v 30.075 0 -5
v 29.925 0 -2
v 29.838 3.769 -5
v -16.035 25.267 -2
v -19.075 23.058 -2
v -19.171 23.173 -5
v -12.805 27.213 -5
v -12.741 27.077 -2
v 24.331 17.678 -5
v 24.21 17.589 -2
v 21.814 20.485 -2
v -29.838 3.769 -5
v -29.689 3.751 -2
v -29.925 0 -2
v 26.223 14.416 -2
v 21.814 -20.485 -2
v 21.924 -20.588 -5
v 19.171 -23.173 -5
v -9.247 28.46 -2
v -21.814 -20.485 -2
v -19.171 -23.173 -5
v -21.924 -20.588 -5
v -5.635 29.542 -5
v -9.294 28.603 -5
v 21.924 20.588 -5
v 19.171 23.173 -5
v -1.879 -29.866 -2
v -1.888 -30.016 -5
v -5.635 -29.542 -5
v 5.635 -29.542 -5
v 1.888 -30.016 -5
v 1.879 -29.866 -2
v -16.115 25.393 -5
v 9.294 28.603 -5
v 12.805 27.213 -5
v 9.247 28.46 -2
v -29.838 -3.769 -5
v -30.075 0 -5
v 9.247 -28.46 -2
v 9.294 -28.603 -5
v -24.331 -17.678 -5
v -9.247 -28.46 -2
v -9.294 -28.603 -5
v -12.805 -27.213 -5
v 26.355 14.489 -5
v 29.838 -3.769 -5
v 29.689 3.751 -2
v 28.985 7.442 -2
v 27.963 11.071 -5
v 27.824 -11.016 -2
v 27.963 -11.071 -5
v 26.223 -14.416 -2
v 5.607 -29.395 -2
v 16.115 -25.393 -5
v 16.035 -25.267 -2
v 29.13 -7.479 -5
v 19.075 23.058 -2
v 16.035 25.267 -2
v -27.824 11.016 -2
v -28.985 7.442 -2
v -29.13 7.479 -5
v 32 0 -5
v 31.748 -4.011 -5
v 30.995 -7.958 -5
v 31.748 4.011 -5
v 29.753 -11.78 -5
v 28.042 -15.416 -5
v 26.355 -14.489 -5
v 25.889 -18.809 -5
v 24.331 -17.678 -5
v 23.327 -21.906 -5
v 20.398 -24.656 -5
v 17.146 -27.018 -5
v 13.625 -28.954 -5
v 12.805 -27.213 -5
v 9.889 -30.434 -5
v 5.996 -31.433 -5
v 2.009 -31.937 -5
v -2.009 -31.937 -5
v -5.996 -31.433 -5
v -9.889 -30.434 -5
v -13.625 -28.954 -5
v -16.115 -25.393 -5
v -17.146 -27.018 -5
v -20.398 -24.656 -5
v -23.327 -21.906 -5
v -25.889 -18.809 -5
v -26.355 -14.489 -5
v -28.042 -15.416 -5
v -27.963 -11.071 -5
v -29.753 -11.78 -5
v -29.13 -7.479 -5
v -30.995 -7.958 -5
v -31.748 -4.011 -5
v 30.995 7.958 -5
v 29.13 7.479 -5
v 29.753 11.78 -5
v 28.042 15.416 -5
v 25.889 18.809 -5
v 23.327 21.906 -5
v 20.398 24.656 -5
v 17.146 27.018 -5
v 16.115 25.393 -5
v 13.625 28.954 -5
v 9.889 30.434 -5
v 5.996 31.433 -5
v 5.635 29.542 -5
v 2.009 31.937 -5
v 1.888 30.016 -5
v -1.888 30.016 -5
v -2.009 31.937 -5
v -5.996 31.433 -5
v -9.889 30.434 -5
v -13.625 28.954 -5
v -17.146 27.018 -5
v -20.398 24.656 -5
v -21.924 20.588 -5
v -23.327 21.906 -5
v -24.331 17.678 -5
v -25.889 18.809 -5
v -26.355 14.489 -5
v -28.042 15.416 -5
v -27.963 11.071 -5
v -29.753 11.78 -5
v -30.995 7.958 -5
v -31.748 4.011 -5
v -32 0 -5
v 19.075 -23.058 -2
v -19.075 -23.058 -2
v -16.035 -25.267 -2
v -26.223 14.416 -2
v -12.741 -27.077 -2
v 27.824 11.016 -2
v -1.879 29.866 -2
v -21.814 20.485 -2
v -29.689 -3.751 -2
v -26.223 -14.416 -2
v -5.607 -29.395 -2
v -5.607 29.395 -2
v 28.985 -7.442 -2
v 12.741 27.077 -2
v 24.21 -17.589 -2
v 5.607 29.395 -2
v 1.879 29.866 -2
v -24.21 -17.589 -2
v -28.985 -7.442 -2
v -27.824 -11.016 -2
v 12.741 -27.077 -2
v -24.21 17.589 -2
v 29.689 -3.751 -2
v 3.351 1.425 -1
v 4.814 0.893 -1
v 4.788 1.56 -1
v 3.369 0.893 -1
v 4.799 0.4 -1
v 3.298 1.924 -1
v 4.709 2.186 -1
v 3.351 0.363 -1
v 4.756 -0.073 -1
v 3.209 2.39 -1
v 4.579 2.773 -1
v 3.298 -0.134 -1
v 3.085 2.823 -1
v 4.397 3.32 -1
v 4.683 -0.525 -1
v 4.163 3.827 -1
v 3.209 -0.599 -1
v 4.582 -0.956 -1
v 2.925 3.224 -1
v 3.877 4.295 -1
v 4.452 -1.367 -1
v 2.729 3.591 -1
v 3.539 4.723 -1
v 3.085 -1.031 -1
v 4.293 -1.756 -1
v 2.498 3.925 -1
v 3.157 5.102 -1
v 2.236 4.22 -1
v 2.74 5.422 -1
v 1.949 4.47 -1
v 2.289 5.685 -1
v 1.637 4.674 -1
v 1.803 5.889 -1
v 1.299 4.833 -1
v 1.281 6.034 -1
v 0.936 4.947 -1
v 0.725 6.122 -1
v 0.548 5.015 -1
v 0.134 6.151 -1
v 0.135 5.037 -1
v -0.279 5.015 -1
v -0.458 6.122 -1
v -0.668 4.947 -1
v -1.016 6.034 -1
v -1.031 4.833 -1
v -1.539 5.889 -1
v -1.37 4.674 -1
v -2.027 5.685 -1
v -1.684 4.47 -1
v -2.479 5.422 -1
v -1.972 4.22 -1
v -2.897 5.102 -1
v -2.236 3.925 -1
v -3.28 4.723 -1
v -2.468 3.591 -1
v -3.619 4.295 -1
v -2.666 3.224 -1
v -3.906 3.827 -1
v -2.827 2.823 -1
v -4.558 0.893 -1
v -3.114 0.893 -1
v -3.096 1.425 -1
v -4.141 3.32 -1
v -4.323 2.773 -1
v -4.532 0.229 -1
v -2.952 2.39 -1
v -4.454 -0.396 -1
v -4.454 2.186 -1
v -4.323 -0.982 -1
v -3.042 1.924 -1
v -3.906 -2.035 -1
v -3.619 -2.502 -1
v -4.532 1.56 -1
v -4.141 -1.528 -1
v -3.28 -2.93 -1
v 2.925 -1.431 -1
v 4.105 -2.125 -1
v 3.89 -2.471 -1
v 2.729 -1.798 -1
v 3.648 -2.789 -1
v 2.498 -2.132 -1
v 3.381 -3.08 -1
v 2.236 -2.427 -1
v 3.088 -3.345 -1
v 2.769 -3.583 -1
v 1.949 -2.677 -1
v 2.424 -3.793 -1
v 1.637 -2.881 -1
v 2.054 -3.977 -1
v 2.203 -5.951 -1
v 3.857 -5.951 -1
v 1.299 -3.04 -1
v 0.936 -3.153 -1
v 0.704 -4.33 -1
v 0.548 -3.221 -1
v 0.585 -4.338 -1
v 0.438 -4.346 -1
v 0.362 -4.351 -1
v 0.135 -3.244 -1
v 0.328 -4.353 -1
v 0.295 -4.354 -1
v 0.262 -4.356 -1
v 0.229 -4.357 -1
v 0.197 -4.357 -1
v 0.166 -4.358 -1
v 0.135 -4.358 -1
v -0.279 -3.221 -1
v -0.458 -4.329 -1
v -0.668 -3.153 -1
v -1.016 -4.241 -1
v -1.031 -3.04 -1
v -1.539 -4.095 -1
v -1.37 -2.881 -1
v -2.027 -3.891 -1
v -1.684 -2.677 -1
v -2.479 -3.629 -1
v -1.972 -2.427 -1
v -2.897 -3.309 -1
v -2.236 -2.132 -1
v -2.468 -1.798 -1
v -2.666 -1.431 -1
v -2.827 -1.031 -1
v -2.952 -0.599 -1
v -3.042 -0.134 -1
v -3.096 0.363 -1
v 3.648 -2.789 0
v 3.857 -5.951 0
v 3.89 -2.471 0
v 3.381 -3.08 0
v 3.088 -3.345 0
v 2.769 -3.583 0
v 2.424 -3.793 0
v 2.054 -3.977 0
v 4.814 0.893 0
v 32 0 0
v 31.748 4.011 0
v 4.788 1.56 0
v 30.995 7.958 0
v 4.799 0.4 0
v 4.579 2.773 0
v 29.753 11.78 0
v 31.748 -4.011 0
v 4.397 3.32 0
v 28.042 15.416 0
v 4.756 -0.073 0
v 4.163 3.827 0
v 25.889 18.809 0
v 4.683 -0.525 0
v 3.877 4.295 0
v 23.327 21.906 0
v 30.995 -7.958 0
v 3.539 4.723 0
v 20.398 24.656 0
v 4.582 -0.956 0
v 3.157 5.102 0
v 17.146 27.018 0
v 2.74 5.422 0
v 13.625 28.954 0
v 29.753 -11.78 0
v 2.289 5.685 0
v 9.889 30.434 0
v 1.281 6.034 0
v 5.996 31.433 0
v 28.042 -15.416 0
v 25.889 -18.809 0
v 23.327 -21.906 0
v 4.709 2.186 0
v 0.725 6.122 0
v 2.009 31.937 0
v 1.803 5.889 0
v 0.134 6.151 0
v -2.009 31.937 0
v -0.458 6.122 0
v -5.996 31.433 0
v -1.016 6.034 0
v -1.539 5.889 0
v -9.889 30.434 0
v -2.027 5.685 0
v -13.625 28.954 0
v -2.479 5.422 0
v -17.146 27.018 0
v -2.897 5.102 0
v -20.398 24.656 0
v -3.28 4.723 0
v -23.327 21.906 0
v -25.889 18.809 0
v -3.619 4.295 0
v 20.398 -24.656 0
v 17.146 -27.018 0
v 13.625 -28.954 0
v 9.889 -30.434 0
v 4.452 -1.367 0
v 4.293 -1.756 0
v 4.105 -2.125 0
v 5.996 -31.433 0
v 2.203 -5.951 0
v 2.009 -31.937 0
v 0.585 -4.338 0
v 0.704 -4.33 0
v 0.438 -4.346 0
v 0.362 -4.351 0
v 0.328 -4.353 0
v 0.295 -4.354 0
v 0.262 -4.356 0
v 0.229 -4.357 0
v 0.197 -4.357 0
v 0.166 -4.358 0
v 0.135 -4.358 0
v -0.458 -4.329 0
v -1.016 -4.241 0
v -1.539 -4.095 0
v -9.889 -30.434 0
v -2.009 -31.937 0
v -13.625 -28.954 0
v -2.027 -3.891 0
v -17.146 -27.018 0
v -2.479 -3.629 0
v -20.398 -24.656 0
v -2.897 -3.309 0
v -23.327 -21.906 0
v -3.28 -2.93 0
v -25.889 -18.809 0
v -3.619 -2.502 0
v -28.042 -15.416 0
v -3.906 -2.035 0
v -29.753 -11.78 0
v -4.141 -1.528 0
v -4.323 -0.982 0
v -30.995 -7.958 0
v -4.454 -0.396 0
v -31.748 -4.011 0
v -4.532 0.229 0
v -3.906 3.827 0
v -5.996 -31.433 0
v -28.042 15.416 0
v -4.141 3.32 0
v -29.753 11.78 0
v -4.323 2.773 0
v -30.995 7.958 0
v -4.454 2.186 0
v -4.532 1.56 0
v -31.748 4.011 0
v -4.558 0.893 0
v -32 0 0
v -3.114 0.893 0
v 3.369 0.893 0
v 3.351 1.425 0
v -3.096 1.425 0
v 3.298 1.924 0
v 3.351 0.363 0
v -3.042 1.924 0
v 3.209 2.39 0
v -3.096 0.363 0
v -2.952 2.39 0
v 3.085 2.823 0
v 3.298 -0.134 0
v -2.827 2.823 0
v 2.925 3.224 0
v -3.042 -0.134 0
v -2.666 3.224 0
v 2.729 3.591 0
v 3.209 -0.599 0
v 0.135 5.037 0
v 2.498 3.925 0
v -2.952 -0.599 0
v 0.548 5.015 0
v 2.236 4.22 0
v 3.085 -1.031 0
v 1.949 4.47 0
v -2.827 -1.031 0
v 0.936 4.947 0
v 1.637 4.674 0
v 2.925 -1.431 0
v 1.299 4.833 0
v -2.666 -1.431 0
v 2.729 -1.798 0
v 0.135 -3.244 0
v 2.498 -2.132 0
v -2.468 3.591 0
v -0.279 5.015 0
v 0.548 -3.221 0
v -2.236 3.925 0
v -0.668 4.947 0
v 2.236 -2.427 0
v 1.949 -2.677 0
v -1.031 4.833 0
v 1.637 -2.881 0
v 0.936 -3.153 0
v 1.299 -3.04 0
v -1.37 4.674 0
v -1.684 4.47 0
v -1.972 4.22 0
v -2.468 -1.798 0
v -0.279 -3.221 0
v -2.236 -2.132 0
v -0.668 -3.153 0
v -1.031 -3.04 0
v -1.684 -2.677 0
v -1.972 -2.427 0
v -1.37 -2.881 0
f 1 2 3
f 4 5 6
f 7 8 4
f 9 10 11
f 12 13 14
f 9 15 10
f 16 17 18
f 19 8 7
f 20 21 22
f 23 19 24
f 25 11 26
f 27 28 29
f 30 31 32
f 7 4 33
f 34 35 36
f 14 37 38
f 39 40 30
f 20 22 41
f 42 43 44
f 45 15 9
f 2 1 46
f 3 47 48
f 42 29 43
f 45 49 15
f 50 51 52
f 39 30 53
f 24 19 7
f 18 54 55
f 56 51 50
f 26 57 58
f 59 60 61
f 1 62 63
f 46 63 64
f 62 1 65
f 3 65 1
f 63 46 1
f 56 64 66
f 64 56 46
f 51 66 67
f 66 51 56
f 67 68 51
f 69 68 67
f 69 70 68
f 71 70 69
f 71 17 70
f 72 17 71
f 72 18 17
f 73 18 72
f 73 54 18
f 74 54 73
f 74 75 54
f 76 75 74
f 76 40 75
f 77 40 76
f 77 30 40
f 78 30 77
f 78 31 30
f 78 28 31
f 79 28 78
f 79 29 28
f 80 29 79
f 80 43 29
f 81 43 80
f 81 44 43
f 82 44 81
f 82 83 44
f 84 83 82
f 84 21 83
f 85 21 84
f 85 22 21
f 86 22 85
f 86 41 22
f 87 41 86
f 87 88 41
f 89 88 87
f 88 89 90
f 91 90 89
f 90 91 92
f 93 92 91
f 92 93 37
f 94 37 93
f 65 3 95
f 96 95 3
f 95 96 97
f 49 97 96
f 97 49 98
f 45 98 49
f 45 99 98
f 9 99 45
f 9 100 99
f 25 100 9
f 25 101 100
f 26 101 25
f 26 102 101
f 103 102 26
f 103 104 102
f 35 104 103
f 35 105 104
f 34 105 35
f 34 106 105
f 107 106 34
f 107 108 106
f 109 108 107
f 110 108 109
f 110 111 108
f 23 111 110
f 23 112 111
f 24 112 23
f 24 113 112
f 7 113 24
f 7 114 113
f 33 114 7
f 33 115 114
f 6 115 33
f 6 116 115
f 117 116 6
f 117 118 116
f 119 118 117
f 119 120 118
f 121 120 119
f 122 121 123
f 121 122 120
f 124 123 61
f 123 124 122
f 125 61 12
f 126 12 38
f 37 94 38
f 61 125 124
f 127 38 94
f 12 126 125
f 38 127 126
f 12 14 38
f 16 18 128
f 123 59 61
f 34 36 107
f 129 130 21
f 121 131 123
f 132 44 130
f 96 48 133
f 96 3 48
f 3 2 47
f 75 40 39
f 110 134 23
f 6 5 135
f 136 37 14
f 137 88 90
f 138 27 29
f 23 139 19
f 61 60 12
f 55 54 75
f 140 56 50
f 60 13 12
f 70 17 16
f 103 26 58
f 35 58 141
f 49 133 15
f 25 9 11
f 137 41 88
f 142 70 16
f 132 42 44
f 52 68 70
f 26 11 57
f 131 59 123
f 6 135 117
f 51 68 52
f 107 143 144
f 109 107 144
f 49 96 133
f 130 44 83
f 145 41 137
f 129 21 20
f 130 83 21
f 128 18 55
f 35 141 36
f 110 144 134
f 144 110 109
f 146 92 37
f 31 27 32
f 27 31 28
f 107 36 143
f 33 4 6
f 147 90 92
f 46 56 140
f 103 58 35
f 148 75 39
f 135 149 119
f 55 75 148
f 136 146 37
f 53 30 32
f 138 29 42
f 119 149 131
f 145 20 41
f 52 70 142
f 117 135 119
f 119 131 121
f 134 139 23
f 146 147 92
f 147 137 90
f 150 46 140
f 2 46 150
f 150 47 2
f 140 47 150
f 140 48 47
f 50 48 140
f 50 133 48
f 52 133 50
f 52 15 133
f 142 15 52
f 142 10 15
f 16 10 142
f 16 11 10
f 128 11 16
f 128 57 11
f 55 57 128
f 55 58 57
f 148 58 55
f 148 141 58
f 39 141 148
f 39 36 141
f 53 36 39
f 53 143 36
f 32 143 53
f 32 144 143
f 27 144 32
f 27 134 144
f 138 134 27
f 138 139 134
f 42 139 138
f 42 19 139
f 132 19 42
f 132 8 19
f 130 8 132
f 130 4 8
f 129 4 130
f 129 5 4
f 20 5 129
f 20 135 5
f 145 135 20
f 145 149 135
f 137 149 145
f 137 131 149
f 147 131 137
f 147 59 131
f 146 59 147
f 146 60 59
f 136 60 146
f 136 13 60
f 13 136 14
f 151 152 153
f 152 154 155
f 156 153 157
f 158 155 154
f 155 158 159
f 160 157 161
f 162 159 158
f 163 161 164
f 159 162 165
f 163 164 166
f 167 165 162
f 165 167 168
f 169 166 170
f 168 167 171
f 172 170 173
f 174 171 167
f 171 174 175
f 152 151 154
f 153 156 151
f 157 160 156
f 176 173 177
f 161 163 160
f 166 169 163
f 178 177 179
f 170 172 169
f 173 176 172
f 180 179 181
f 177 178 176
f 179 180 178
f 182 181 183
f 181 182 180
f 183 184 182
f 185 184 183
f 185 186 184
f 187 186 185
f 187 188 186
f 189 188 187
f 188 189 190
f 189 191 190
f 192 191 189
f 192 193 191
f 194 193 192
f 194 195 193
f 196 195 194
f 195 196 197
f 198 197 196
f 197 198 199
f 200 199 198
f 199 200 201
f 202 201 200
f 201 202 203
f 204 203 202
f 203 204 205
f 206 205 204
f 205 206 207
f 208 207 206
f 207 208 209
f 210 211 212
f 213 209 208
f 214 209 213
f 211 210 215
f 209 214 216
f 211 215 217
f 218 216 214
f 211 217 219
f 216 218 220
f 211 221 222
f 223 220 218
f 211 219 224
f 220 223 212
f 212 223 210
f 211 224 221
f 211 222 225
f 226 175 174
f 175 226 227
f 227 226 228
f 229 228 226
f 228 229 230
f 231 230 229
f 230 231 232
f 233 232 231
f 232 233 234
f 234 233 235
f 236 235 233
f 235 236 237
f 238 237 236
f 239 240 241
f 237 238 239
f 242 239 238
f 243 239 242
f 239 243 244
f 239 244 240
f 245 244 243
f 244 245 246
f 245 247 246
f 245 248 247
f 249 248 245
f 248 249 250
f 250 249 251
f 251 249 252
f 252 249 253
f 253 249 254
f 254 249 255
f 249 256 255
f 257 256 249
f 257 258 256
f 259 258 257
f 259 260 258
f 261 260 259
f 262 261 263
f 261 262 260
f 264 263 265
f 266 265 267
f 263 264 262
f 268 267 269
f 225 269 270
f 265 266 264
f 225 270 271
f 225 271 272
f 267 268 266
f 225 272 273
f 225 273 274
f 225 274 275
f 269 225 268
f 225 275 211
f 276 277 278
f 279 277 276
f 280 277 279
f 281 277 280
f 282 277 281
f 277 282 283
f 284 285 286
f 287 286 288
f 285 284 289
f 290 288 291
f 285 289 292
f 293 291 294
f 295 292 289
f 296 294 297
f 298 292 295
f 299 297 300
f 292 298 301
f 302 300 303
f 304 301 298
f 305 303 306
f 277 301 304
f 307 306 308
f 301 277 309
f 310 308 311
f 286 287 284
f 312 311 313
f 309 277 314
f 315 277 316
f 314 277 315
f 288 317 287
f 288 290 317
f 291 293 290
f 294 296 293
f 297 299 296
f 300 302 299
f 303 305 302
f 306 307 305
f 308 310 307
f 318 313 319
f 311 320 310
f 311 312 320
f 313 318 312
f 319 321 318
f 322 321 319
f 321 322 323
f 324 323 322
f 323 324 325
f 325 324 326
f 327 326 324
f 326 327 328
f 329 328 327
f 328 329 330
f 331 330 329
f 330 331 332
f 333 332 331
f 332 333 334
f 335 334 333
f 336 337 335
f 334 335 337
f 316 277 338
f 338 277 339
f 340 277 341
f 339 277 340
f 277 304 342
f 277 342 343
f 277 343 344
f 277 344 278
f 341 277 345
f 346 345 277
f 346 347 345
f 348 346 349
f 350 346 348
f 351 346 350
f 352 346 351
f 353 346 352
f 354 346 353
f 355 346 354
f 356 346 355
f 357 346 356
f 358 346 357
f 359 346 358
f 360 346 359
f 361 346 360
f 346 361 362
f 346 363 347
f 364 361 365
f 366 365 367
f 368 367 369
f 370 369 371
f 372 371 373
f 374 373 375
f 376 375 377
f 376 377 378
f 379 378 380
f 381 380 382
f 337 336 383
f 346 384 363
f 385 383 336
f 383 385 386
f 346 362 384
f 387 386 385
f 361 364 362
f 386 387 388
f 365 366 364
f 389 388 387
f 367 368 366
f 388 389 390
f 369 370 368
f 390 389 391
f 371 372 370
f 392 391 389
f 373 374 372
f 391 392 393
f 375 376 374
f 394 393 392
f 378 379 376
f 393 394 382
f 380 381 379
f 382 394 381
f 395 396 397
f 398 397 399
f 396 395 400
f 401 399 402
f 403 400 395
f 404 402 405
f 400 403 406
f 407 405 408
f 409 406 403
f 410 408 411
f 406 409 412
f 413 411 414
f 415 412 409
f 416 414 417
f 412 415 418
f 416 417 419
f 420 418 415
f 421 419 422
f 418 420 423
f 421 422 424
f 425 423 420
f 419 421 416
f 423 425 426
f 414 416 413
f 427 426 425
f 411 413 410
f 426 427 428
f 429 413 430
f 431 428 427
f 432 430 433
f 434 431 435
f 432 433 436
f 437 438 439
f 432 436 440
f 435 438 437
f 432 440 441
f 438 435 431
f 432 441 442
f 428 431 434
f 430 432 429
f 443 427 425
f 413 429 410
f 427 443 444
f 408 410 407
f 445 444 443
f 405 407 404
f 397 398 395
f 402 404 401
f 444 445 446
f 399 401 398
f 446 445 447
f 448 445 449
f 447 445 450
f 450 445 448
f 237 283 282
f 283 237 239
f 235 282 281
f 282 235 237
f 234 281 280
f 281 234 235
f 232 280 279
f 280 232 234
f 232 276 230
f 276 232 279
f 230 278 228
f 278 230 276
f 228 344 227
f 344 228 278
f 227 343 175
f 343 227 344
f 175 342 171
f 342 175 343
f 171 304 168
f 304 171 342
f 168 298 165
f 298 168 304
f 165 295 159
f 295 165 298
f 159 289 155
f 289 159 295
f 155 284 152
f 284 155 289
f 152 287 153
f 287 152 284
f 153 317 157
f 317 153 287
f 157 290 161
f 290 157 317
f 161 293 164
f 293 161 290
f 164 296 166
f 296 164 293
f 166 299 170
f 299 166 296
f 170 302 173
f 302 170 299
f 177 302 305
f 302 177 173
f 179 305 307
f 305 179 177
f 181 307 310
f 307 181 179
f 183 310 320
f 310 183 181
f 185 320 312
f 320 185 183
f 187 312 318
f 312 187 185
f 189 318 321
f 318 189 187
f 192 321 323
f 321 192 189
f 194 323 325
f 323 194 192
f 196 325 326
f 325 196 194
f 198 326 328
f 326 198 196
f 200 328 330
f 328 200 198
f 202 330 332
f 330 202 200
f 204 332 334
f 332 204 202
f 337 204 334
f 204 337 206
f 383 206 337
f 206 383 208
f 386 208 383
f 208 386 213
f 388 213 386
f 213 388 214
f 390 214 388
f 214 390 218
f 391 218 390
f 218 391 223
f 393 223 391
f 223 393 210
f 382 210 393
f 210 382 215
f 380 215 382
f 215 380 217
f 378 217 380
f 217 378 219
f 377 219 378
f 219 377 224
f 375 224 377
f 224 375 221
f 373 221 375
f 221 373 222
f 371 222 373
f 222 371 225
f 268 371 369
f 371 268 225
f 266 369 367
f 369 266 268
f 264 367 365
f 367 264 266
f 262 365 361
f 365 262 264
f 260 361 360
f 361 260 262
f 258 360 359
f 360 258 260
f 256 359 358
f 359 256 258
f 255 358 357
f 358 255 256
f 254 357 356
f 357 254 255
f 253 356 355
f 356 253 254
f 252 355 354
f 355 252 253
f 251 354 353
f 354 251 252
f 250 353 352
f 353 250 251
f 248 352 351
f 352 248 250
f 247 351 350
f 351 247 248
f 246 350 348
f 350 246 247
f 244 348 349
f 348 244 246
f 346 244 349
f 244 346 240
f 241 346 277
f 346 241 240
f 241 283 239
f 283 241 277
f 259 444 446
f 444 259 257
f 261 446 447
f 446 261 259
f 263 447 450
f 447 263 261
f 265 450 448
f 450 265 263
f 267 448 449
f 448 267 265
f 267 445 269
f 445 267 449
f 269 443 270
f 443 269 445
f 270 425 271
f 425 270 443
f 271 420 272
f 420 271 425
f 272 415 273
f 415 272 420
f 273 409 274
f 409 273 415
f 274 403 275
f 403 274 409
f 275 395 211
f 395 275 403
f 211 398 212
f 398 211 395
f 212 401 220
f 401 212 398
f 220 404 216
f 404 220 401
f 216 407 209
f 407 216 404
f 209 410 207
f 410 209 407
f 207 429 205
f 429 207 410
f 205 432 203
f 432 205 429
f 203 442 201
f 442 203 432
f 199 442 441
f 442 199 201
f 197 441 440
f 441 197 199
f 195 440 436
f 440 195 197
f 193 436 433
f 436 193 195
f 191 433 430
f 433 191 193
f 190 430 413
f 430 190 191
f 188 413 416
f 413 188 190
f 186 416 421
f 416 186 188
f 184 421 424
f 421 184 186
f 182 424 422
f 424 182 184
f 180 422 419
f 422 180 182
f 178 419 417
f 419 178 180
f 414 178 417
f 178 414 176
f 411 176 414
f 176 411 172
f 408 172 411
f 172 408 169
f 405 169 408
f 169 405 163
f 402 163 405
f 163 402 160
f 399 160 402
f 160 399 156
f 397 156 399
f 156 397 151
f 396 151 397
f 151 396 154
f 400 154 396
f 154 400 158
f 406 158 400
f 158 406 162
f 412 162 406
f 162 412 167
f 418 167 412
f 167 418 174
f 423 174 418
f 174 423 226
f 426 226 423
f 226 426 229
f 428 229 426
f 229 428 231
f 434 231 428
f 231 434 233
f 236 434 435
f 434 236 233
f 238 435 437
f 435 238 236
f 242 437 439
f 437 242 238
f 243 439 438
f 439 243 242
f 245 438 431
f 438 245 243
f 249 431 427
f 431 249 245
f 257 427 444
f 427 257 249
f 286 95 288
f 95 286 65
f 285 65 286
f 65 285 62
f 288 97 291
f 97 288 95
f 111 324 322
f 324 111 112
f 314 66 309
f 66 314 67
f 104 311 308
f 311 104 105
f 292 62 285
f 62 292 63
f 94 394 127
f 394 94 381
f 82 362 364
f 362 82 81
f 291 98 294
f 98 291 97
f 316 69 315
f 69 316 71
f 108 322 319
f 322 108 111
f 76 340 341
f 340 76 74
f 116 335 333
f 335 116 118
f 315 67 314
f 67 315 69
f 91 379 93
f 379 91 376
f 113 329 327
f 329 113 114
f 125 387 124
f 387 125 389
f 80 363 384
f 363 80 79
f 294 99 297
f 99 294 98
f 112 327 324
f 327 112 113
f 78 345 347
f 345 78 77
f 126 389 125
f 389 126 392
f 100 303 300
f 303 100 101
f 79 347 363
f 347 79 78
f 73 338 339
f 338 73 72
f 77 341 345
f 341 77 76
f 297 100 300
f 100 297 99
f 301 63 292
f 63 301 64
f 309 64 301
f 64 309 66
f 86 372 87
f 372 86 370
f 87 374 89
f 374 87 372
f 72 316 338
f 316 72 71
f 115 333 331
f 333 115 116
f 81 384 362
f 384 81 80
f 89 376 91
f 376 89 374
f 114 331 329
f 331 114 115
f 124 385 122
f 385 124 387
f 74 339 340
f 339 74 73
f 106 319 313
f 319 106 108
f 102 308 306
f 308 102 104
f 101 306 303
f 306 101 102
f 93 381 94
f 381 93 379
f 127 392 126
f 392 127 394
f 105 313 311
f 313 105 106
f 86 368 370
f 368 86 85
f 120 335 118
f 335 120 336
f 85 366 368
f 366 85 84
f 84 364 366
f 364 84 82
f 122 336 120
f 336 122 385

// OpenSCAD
$fn = 50;

difference() {
	union() {
		translate(v = [0, 0, -5.0]) {
			cylinder(h = 5, r = 32.0);
		}
	}
	union() {
		#translate(v = [0, 0, -5.0]) {
			cylinder(h = 3, r1 = 30.075, r2 = 29.925);
		}
		translate(v = [0, 0, -1]) {
			linear_extrude(height = 1) {
				text(font = "Impact", halign = "center", size = 10, text = "Q", valign = "center");
			}
		}
	}
}
